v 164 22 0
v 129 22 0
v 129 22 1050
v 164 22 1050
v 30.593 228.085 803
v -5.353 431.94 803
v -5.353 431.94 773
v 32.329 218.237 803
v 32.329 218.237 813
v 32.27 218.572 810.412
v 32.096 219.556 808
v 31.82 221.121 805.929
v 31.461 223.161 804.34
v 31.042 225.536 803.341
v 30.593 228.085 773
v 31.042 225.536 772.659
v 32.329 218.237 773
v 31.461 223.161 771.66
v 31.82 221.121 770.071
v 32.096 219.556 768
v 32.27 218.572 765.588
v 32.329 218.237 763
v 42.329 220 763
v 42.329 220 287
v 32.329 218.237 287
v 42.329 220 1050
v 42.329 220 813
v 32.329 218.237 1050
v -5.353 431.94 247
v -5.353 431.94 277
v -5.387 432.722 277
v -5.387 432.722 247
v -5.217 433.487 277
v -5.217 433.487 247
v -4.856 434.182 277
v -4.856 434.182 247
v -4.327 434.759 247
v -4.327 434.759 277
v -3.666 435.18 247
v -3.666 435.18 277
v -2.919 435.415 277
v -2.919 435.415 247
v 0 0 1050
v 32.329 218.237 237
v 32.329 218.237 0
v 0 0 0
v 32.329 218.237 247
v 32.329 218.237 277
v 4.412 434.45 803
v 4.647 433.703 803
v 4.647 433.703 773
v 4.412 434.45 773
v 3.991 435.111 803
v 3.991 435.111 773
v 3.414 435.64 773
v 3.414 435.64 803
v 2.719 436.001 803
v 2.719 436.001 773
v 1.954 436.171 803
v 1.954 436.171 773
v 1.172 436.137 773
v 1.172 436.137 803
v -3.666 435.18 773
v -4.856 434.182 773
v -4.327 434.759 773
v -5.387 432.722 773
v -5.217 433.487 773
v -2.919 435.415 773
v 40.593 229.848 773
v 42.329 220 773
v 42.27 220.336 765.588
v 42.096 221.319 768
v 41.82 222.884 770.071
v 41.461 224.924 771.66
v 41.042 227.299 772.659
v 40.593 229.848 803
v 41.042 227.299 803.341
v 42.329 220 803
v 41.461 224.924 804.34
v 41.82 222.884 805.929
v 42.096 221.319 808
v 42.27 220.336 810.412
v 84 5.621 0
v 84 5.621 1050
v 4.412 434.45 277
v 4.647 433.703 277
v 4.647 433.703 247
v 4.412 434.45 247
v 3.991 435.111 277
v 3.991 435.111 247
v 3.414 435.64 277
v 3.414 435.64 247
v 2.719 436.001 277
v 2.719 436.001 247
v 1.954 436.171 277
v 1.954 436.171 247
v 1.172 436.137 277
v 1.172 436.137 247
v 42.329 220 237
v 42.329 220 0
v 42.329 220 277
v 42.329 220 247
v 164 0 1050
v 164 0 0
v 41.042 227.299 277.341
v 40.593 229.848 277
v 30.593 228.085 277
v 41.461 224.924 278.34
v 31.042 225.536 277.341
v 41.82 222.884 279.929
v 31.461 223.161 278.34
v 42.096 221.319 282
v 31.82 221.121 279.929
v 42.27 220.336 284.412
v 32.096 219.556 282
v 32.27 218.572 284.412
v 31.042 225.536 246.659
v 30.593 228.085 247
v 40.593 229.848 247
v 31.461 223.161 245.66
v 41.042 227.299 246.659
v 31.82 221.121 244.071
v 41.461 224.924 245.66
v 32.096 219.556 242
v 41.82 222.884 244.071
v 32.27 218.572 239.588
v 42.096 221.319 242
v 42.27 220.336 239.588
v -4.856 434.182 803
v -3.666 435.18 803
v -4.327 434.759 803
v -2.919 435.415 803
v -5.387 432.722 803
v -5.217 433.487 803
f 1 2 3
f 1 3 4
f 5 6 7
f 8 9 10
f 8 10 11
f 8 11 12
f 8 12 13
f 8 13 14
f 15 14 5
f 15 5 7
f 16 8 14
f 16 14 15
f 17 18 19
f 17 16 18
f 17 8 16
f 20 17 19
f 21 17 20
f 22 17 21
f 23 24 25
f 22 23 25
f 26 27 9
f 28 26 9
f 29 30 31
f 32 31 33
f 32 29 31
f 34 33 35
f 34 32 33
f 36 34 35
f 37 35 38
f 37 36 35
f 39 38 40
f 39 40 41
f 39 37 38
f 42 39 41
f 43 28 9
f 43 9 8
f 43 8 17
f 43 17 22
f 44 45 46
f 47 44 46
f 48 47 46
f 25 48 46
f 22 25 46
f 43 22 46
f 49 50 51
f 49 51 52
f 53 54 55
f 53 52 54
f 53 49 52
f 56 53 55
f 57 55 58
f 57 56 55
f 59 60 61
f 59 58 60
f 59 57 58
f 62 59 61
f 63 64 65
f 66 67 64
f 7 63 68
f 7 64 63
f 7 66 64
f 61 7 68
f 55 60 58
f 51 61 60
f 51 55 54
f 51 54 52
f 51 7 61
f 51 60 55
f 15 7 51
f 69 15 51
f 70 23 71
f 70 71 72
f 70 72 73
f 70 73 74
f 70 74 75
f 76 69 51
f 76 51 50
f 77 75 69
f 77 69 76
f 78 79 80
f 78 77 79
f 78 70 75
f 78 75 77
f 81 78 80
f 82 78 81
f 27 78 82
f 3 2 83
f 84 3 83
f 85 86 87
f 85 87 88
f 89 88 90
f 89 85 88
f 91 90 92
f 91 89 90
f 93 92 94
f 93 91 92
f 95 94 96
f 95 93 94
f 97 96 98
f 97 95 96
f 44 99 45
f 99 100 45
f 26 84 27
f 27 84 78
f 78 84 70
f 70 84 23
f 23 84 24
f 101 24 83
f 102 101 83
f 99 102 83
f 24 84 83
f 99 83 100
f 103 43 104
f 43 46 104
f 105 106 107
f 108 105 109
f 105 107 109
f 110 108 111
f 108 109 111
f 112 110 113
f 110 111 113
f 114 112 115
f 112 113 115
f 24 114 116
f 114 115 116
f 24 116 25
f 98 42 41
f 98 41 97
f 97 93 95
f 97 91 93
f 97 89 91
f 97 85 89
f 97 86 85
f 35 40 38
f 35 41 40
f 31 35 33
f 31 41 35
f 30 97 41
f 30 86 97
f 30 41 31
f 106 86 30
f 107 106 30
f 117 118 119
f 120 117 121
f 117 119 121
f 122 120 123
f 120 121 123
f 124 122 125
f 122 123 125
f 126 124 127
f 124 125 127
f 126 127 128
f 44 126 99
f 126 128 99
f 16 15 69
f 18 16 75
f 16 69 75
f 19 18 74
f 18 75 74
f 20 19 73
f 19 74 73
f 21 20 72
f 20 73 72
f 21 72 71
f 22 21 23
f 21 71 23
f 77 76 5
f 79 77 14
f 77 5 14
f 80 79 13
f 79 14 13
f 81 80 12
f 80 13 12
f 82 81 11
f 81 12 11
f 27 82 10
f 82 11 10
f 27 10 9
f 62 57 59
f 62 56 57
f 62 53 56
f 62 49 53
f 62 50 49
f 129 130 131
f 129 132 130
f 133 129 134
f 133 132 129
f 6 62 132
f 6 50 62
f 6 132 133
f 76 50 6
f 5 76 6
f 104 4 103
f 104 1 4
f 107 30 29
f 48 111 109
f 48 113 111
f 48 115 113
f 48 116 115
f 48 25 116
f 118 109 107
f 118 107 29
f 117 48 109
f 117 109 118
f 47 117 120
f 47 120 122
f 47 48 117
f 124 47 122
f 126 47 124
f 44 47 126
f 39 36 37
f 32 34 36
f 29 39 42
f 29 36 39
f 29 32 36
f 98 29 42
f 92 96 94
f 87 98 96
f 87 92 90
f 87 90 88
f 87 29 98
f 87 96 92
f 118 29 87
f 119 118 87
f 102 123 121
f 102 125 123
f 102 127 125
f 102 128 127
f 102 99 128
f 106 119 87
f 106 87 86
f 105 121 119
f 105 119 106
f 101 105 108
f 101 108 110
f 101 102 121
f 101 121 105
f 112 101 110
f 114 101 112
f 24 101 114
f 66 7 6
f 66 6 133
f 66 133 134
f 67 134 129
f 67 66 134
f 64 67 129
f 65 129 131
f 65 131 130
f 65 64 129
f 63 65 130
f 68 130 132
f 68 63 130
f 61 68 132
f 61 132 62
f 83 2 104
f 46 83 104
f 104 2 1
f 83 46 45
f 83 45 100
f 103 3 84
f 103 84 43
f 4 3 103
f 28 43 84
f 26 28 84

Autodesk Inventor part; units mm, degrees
ref_plane "YZ Plane" through (0, 0, 0) normal (1, 0, 0) x (0, 1, 0)
ref_plane "XZ Plane" through (0, 0, 0) normal (0, 1, 0) x (-1, 0, 0)
ref_plane "XY Plane" through (0, 0, 0) normal (0, 0, 1) x (1, 0, 0)
sketch "Sketch1" plane through (0, 0, 0) normal (0, 0, 1) x (1, 0, 0)
  line L0 (0, 0) -> (132, 0)
  line L1 (42.329, 220) -> (32.329, 218.2367)
  line L2 (32.329, 218.2367) -> (0, 0)
  line L3 (129, 22) -> (84, 5.6213)
  line L4 (84, 5.6213) -> (114.3391, 5.6213) construction
  line L5 (84, 5.6213) -> (42.329, 220)
  line L6 (132, 0) -> (129, 22)
  line L7 (129, 22) -> (164, 22)
  line L8 (164, 22) -> (164, 0)
  line L9 (164, 0) -> (132, 0)
  dimension "d0" = 132
  dimension "d1" = 220
  dimension "d6" = 20
  dimension "d7" = 81
  dimension "d8" = 10
  dimension "d9" = 10
  dimension "d22" = 45
  dimension "d23" = 22
  dimension "d24" = 3
extrude "Extrusion1" add sketch "Sketch1" along normal blind 1050
sketch "Sketch2" plane through (32.329, 218.2367, 1050) normal (-0.1736482, 0.9848078, 0) x (0.9848078, 0.1736482, 0)
  line L0 (0, 277) -> (10.1543, 277)
  line L1 (10.1543, 277) -> (10.1543, 247)
  line L2 (10.1543, 247) -> (0, 247)
  line L3 (0, 247) -> (0, 277)
  line L4 (0, 1050) -> (0, 0) construction
  line L5 (0, 803) -> (10.1543, 803)
  line L6 (10.1543, 803) -> (10.1543, 773)
  line L7 (10.1543, 773) -> (0, 773)
  line L8 (0, 773) -> (0, 803)
  line L9 (13.9657, 1050) -> (0, 1050) construction
  line L10 (10.1543, 1050) -> (10.1543, 0) construction
  point P0 (-69.7343, 1050)
  dimension "d12" = 30
  dimension "d13" = 30
  dimension "d14" = 247
  dimension "d15" = 247
extrude "Extrusion2" add sketch "Sketch2" along normal blind 220
fillet "Fillet1" radius 3 4 edges at (4.1264, 436.6577, 788) (-5.8736, 434.8944, 788) (4.1264, 436.6577, 262) (-5.8736, 434.8944, 262)
fillet "Fillet2" radius 10 4 edges at (37.329, 219.1184, 803) (37.329, 219.1184, 277) (37.329, 219.1184, 773) (37.329, 219.1184, 247)
properties part number "sostenedor1"
